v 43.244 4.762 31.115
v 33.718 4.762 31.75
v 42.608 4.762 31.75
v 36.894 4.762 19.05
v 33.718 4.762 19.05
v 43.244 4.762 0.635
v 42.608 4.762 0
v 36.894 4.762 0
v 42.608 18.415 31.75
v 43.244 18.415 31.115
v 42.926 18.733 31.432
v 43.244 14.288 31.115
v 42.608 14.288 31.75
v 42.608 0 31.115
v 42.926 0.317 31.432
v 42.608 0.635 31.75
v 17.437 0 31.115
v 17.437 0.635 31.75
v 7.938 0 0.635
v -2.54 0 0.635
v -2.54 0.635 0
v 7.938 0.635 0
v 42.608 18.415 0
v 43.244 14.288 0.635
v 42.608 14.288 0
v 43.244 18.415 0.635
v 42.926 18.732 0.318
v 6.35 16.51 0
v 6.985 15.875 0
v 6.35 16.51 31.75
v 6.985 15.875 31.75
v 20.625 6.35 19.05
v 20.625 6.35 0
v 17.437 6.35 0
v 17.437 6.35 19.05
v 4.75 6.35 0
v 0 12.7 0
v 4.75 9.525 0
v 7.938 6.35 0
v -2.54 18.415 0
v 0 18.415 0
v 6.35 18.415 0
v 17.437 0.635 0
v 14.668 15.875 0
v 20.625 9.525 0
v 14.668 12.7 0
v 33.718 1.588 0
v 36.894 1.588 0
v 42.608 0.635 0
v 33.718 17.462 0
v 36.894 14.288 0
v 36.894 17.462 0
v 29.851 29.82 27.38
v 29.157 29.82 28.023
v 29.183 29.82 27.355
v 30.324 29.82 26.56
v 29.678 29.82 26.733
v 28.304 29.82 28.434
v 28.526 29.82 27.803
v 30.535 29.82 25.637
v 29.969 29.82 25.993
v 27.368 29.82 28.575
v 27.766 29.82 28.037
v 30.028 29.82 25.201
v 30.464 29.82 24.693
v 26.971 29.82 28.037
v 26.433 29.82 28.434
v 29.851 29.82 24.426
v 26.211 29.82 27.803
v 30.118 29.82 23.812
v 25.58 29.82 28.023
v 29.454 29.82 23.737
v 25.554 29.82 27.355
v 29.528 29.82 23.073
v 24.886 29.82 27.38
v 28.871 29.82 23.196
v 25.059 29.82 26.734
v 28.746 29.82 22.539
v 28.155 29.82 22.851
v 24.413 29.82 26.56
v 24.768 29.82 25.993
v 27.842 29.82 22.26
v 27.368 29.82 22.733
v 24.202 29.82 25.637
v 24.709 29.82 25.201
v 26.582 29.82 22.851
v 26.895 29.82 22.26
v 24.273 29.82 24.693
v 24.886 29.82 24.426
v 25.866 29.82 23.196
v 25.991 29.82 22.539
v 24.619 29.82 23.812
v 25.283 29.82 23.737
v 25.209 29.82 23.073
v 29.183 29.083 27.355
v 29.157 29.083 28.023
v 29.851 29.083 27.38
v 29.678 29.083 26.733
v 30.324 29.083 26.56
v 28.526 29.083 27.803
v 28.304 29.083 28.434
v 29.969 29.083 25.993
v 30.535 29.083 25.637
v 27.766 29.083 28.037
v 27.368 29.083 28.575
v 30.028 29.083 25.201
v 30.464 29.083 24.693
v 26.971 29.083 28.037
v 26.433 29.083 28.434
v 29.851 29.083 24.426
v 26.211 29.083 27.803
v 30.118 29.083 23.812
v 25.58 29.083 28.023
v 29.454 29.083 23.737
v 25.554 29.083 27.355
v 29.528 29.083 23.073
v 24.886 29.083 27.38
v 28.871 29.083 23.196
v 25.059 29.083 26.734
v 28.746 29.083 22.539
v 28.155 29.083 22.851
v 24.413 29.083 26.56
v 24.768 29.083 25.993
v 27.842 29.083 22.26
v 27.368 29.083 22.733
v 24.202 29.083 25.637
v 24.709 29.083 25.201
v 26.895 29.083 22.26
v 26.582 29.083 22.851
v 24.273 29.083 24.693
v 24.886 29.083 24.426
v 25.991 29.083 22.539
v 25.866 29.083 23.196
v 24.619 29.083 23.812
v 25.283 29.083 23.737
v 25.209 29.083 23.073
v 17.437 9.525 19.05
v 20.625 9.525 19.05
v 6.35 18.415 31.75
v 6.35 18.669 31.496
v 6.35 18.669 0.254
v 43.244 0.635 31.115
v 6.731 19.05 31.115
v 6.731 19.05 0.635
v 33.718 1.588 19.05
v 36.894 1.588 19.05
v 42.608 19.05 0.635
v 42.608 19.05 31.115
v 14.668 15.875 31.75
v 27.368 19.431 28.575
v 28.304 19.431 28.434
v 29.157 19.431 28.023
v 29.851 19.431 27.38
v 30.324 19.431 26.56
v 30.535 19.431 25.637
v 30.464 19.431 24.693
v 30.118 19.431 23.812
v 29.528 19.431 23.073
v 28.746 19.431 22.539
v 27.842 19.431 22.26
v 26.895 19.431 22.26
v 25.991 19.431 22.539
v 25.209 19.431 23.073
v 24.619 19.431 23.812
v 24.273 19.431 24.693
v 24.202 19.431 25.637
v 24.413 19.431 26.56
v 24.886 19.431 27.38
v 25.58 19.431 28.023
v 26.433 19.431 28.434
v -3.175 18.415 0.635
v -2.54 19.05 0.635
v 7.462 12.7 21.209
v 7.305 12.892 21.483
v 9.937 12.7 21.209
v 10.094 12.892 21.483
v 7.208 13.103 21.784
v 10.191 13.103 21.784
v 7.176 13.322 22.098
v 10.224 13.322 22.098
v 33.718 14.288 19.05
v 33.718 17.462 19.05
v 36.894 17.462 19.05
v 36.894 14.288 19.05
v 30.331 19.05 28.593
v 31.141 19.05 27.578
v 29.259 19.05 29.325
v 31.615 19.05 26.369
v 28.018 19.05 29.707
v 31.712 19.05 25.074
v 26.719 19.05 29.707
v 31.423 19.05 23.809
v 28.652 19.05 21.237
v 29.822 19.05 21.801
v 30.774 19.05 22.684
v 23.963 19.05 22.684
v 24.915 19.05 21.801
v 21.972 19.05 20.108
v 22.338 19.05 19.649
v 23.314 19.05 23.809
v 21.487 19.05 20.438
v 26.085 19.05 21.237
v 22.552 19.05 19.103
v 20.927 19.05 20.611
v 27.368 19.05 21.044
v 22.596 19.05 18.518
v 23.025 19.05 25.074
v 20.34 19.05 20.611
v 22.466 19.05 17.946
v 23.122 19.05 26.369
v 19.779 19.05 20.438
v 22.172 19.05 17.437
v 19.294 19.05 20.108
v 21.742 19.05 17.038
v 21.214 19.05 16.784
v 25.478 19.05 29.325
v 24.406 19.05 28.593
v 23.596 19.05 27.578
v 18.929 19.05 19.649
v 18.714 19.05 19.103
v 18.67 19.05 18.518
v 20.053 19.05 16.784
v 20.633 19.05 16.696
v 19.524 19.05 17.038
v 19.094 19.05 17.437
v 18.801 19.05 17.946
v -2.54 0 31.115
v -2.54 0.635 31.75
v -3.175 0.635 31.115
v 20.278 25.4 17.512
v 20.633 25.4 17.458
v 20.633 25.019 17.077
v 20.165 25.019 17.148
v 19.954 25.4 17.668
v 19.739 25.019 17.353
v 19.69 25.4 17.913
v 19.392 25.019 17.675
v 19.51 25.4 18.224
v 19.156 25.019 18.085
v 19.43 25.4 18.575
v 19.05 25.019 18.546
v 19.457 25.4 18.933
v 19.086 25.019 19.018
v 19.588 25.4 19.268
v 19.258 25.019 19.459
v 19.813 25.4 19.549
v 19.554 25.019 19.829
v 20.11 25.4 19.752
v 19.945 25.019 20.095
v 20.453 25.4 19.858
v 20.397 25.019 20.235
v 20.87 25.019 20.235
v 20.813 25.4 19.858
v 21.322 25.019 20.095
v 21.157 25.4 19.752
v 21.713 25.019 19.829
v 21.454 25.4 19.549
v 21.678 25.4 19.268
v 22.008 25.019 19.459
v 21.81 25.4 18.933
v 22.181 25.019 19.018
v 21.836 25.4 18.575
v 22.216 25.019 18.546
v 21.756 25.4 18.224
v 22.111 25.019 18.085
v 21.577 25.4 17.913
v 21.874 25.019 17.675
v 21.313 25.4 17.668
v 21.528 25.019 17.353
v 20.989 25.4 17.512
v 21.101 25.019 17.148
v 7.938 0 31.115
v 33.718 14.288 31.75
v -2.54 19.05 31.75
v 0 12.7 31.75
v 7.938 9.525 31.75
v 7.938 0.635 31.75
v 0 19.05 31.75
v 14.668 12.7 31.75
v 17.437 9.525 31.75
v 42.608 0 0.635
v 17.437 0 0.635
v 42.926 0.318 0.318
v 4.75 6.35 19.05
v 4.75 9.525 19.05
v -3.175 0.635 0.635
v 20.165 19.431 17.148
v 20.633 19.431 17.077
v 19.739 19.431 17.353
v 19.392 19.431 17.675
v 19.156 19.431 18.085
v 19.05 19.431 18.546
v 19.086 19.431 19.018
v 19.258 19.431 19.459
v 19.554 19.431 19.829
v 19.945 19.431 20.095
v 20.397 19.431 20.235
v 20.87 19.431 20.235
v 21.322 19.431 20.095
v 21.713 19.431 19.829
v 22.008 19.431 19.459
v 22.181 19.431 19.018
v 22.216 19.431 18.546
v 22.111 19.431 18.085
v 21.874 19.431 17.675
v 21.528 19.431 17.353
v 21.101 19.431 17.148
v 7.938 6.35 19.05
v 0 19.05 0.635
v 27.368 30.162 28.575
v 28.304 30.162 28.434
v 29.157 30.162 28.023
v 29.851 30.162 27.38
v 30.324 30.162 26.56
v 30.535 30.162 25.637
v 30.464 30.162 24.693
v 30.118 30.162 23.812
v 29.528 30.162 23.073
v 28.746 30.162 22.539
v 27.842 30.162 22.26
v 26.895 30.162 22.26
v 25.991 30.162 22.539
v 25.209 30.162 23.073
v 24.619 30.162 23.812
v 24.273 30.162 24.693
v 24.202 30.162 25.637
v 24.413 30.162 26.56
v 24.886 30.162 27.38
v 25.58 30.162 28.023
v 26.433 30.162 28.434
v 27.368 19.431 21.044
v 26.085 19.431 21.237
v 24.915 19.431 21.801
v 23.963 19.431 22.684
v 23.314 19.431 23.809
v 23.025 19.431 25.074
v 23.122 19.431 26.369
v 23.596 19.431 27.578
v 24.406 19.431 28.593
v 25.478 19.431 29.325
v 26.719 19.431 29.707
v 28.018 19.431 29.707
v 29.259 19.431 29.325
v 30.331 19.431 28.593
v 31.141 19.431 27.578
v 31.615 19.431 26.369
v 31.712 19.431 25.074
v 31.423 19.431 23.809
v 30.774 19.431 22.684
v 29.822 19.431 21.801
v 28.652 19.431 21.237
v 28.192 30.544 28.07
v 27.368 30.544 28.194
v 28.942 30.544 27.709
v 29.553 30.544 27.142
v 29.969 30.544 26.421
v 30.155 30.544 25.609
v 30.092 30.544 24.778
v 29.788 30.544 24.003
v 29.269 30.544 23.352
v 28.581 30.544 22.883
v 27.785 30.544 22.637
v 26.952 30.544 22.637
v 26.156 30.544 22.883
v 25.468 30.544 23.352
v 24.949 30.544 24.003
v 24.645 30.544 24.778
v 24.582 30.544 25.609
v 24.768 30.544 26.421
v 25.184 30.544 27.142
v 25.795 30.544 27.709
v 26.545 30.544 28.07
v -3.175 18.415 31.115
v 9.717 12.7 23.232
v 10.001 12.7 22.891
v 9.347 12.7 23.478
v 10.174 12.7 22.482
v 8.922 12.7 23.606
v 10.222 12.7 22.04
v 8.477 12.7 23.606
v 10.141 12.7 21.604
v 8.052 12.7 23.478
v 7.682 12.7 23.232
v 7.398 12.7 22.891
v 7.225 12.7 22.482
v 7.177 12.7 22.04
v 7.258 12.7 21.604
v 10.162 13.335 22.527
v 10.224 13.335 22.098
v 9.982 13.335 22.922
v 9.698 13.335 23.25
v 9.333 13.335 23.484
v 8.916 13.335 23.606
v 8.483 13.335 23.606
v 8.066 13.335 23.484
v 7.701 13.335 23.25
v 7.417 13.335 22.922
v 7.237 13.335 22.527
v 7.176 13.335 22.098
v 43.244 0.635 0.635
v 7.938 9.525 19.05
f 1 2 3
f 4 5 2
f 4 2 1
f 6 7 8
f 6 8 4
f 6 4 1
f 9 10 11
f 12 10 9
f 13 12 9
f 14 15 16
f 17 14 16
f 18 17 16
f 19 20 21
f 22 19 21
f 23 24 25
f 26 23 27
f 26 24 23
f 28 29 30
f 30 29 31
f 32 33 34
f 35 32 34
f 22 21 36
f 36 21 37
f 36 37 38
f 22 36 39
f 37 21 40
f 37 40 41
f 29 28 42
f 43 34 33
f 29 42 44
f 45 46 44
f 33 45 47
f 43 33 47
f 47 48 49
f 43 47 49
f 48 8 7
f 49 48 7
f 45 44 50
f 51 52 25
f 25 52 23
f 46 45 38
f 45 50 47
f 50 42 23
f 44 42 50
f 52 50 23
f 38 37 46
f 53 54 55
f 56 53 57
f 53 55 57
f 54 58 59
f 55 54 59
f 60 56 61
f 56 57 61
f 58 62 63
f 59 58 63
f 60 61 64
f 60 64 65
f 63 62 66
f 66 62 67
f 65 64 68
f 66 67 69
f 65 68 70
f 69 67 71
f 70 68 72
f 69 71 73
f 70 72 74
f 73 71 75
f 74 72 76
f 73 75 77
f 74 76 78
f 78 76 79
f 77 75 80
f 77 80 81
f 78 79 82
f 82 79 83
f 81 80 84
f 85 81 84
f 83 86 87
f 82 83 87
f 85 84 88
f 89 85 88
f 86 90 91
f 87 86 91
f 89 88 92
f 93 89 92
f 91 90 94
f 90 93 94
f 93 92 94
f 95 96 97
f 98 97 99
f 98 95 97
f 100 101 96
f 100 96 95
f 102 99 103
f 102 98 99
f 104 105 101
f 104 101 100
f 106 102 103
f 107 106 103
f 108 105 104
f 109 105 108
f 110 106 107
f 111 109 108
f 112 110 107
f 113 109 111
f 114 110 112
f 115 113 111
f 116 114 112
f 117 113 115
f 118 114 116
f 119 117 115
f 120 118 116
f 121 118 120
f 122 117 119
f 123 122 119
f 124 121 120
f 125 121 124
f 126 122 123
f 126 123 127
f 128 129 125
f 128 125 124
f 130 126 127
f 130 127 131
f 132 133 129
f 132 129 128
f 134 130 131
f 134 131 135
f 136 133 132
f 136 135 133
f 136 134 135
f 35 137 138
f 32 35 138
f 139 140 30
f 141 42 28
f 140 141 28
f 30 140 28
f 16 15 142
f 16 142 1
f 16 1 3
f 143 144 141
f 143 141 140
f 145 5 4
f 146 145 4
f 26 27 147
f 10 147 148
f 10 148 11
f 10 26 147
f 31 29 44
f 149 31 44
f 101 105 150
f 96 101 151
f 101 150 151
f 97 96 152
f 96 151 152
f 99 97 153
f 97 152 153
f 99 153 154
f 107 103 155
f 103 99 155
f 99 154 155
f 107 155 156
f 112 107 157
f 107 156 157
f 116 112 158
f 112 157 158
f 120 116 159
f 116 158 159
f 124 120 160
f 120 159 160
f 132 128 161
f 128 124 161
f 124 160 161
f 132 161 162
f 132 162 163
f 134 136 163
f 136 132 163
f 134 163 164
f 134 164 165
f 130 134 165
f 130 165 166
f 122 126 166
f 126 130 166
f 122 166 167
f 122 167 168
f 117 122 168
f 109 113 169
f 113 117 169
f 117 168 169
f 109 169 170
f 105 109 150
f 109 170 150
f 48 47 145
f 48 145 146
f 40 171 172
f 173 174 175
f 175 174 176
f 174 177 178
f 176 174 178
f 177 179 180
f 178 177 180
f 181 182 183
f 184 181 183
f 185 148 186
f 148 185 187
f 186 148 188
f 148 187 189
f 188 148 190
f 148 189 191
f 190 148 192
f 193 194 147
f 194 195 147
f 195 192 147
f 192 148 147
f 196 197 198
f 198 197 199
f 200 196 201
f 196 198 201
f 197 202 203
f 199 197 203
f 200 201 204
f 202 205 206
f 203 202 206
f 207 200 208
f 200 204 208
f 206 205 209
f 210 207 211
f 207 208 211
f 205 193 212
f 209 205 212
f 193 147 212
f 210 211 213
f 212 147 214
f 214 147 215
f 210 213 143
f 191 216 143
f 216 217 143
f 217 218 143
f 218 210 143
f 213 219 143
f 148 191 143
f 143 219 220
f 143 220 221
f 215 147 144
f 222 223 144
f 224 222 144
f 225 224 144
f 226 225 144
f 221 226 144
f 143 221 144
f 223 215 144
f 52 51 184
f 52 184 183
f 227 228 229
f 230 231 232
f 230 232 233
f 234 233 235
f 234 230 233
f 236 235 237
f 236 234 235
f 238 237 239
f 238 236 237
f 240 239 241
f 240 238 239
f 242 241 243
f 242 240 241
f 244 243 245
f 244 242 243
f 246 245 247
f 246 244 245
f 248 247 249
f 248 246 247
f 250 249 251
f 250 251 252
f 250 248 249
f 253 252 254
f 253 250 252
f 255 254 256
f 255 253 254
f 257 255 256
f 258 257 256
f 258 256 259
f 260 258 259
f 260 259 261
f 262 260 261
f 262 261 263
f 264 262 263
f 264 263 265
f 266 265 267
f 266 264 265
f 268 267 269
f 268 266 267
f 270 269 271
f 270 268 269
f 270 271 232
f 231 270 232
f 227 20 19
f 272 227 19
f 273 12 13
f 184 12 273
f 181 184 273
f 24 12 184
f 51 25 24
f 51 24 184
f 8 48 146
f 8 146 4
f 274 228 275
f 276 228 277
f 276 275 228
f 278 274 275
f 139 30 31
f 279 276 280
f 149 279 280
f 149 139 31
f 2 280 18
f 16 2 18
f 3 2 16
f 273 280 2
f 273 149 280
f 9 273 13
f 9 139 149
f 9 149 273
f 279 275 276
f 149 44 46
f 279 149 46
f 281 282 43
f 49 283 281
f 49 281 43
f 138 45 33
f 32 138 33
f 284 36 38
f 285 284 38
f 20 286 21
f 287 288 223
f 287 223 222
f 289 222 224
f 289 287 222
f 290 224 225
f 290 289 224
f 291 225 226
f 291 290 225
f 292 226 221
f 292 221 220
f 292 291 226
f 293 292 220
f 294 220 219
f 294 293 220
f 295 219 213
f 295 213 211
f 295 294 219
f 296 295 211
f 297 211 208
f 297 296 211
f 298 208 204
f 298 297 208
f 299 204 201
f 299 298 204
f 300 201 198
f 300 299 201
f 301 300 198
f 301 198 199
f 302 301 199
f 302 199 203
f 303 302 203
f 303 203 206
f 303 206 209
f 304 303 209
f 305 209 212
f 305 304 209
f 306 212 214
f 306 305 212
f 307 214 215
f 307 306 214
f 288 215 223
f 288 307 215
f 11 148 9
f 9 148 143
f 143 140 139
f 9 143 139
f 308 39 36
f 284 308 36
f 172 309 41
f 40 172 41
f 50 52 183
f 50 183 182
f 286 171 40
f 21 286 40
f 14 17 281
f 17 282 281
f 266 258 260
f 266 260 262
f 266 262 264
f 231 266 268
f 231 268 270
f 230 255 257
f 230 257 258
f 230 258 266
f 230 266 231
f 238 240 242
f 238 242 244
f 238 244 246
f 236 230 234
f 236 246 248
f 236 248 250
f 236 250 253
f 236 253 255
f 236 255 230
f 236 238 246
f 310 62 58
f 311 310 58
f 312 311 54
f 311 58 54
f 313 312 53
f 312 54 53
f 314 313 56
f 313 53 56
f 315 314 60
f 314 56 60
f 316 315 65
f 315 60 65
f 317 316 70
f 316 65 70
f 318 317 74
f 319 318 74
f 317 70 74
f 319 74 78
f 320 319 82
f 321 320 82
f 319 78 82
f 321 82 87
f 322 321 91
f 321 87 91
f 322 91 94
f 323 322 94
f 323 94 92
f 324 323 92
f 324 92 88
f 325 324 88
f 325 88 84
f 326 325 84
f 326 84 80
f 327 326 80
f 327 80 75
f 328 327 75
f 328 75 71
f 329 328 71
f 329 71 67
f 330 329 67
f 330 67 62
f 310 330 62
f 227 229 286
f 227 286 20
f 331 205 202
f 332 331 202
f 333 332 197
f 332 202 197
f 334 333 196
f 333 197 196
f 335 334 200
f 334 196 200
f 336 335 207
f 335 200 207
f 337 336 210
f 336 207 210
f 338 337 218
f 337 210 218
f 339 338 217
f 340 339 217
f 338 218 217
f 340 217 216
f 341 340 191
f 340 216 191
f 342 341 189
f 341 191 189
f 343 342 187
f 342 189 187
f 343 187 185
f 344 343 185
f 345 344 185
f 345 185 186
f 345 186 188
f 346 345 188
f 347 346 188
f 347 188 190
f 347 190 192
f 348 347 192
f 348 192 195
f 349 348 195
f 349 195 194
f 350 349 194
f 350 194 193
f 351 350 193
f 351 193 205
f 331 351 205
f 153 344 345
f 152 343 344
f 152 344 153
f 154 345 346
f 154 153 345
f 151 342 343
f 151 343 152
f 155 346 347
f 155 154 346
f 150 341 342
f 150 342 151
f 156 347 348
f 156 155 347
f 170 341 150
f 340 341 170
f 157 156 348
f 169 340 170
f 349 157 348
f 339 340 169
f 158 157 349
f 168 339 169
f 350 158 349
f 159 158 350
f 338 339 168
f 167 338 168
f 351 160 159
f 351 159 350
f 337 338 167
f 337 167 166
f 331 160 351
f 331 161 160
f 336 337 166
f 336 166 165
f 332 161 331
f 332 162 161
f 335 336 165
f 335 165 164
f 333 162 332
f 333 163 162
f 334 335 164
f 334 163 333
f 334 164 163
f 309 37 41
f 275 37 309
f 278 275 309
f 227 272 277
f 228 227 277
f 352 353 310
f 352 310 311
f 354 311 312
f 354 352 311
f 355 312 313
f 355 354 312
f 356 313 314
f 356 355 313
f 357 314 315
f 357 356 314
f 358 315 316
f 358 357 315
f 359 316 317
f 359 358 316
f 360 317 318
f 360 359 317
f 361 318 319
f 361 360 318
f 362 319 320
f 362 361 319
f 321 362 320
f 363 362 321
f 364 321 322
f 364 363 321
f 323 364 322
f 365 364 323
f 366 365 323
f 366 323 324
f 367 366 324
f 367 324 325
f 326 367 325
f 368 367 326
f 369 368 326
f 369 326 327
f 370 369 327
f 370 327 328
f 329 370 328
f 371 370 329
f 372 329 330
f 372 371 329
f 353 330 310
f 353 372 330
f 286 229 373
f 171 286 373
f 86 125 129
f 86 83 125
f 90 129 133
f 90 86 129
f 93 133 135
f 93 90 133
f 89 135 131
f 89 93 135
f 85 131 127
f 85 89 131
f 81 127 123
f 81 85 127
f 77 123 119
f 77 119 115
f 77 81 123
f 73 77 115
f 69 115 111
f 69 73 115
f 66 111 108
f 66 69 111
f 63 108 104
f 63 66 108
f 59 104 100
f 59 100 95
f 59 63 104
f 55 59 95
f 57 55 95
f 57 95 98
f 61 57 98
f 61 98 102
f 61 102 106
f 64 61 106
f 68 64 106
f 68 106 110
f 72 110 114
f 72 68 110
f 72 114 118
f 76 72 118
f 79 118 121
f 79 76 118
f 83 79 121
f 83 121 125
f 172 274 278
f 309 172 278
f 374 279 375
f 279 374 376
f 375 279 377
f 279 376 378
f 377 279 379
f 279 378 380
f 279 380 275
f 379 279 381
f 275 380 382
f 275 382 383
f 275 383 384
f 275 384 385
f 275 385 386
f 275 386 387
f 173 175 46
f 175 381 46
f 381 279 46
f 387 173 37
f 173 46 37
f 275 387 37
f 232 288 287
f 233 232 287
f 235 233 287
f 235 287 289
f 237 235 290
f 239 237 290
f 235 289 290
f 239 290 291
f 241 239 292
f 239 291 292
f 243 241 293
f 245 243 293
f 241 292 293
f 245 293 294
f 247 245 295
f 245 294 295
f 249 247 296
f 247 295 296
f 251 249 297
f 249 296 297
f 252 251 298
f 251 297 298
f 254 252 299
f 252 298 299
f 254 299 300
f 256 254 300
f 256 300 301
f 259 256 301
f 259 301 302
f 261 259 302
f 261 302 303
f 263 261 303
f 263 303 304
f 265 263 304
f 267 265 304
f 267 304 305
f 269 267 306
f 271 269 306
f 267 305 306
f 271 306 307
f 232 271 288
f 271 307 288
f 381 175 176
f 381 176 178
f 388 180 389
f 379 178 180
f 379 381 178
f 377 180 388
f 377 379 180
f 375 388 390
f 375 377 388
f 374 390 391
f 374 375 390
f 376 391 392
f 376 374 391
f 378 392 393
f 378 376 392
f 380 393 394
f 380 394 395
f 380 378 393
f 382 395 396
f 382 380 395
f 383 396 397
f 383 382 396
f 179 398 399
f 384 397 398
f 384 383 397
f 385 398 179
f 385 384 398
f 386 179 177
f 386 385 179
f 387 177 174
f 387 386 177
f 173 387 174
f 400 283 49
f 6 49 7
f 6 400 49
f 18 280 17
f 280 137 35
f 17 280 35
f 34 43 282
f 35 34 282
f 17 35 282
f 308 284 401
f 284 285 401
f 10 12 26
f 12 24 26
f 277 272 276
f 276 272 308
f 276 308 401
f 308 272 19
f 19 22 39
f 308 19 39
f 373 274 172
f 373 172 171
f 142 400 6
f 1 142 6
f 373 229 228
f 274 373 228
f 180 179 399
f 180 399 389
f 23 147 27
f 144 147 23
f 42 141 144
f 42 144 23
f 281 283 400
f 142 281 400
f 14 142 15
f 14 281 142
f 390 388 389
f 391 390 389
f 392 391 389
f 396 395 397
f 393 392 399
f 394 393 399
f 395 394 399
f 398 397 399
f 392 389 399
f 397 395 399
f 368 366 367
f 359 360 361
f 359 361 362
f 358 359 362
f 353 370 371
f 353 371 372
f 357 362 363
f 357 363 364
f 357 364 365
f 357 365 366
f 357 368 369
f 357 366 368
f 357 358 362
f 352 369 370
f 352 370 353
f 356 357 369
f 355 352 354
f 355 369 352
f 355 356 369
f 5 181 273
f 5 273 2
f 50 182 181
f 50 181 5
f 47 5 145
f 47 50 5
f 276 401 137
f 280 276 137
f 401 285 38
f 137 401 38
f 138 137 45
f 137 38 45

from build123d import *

# Parameters (mm, degrees)
BOSS_EXTRUDE1_DEPTH  = 31.75
CUT_EXTRUDE2_DEPTH   = 57.92947648
CUT_EXTRUDE1_DEPTH   = 57.92947648
FILLET1_R            = 2.54
CHAMFER1_SIZE        = 0.635
SKETCH5_R            = 4.3561
BOSS_EXTRUDE3_DEPTH  = 0.381
SKETCH6_R            = 3.175
BOSS_EXTRUDE4_DEPTH  = 11.1125
CHAMFER7_SIZE        = 0.381
CUT_EXTRUDE3_DEPTH   = 57.92947648
SKETCH12_W           = 19.05
SKETCH12_H           = 19.05
BOSS_EXTRUDE9_DEPTH  = 31.75
CUT_EXTRUDE4_DEPTH   = 62.733039651
CHAMFER6_SIZE        = 0.635
SKETCH16_W           = 1.016
SKETCH16_H           = 0.7366
SKETCH7_R            = 1.5875
BOSS_EXTRUDE11_DEPTH = 6.35
CHAMFER9_SIZE        = 0.381
SKETCH18_W           = 3.81
SKETCH18_H           = 3.81
BOSS_EXTRUDE12_DEPTH = 12.7
BOSS_EXTRUDE13_DEPTH = 0.635
CHAMFER10_SIZE       = 0.889
CHAMFER10_SIZE2      = 0.622484501
SKETCH20_W           = 3.175
SKETCH20_H           = 19.05
BOSS_EXTRUDE14_DEPTH = 31.75


with BuildPart() as part:
    # Sketch1 → Boss-Extrude1 (new body)
    with BuildSketch(Plane.XY):
        Polygon((0, 0), (7.9375, 0), (7.9375, 6.35), (4.7498, 6.35), (4.7498, 9.525), (20.6248, 9.525), (20.6248, 6.35), (17.4371, 6.35), (17.4371, 0), (43.2435, 0), (43.2435, 19.05), (0, 19.05), align=None)
    extrude(amount=BOSS_EXTRUDE1_DEPTH)

    # Sketch3 → Cut-Extrude2 (cut, through all)
    with BuildSketch(Plane.XY):
        Polygon((6.35, 15.875), (14.6685, 15.875), (14.6685, 12.7), (0, 12.7), (0, 19.05), (6.35, 19.05), align=None)
    extrude(amount=CUT_EXTRUDE2_DEPTH, mode=Mode.SUBTRACT)

    # Sketch2 → Cut-Extrude1 (cut, through all)
    with BuildSketch(Plane.XY):
        Polygon((25.3873, 0), (43.2435, 9.525), (43.2435, 0), align=None)
    extrude(amount=CUT_EXTRUDE1_DEPTH, mode=Mode.SUBTRACT)

    # Fillet1
    fillet1_edges = [part.edges().sort_by_distance(p)[0] for p in [
        (43.2435, 19.05, 15.875),
        (25.3873, 0, 15.875),
        (43.2435, 9.525, 15.875),
    ]]
    fillet(fillet1_edges, radius=FILLET1_R)

    # Chamfer1
    chamfer1_edges = [part.edges().sort_by_distance(p)[0] for p in [
        (6.35, 15.875, 15.875),
    ]]
    chamfer(chamfer1_edges, length=CHAMFER1_SIZE)

    # Sketch5 → Boss-Extrude3 (add)
    with BuildSketch(Plane(origin=(0, 19.05, 0), x_dir=(1, 0, 0), z_dir=(0, 1, 0))):
        with Locations(Location((27.3685, -25.4, 0), (0, 0, 90))):
            Circle(SKETCH5_R)
    extrude(amount=BOSS_EXTRUDE3_DEPTH)

    # Sketch6 → Boss-Extrude4 (add)
    with BuildSketch(Plane(origin=(0, 19.431, 0), x_dir=(1, 0, 0), z_dir=(0, 1, 0))):
        with Locations(Location((27.3685, -25.4, 0), (0, 0, 270))):
            Circle(SKETCH6_R)
    extrude(amount=BOSS_EXTRUDE4_DEPTH)

    # Chamfer7
    chamfer7_edges = [part.edges().sort_by_distance(p)[0] for p in [
        (6.35, 19.05, 15.875),
        (27.3685, 30.5435, 22.225),
    ]]
    chamfer(chamfer7_edges, length=CHAMFER7_SIZE)

    # Sketch9 → Cut-Extrude3 (cut, through all)
    with BuildSketch(Plane(origin=(0, 19.05, 0), x_dir=(1, 0, 0), z_dir=(0, 1, 0))):
        Polygon((27.3685, 0), (43.2435, -19.05), (43.2435, 0), align=None)
    extrude(amount=-CUT_EXTRUDE3_DEPTH, mode=Mode.SUBTRACT)

    # Sketch12 → Boss-Extrude9 (add, through all)
    with BuildSketch(Plane.XY):
        with Locations((33.7185, 9.525)):
            Rectangle(SKETCH12_W, SKETCH12_H)
    extrude(amount=BOSS_EXTRUDE9_DEPTH)

    # Sketch13 → Cut-Extrude4 (cut, through all)
    with BuildSketch(Plane.XY):
        Polygon((43.2435, 14.2875), (36.8935, 14.2875), (36.8935, 17.4625), (33.7185, 17.4625), (33.7185, 1.5875), (36.8935, 1.5875), (36.8935, 4.7625), (43.2435, 4.7625), align=None)
    extrude(amount=CUT_EXTRUDE4_DEPTH, mode=Mode.SUBTRACT)

    # Chamfer6
    chamfer6_edges = [part.edges().sort_by_distance(p)[0] for p in [
        (43.2435, 19.05, 15.875),
        (43.2435, 0, 15.875),
        (43.2435, 2.38125, 0),
        (43.2435, 16.66875, 0),
    ]]
    chamfer(chamfer6_edges, length=CHAMFER6_SIZE)

    # Sketch16 → Cut-Revolve1 (revolve, cut)
    with BuildSketch(Plane.XY.offset(25.4), mode=Mode.PRIVATE) as cut_revolve1_sk:
        with Locations((24.1935, 29.4513)):
            Rectangle(SKETCH16_W, SKETCH16_H)
    revolve(cut_revolve1_sk.sketch.rotate(Axis((27.3685, 30.1625, 25.4), (0, 1, 0)), 270), axis=Axis((27.3685, 30.1625, 25.4), (0, 1, 0)), mode=Mode.SUBTRACT)

    # Sketch7 → Boss-Extrude11 (add)
    with BuildSketch(Plane(origin=(0, 19.05, 0), x_dir=(1, 0, 0), z_dir=(0, 1, 0))):
        with Locations(Location((20.633307909, -18.664807909, 0), (0, 0, 90))):
            Circle(SKETCH7_R)
    extrude(amount=BOSS_EXTRUDE11_DEPTH)

    # Chamfer9
    chamfer9_edges = [part.edges().sort_by_distance(p)[0] for p in [
        (20.633307909, 19.05, 20.252307909),
        (20.633307909, 25.4, 20.252307909),
    ]]
    chamfer(chamfer9_edges, length=CHAMFER9_SIZE)

    # Sketch18 → Boss-Extrude12 (add)
    with BuildSketch(Plane.XY.offset(31.75)):
        with Locations((6.0325, 8.001)):
            Rectangle(SKETCH18_W, SKETCH18_H)
        with Locations((19.3421, 8.001)):
            Rectangle(SKETCH18_W, SKETCH18_H)
        with Locations((35.3695, 2.8575)):
            Rectangle(SKETCH18_W, SKETCH18_H)
        with Locations((35.3695, 16.1925)):
            Rectangle(SKETCH18_W, SKETCH18_H)
    extrude(amount=-BOSS_EXTRUDE12_DEPTH)

    # Sketch19 → Boss-Extrude13 (add)
    with BuildSketch(Plane(origin=(0, 12.7, 0), x_dir=(1, 0, 0), z_dir=(0, 1, 0))):
        with BuildLine():
            Line((7.1755, -22.098), (10.2235, -22.098))
            ThreePointArc((10.2235, -22.098), (8.6995, -23.622), (7.1755, -22.098))
        make_face()
    extrude(amount=BOSS_EXTRUDE13_DEPTH)

    # Chamfer10
    chamfer10_edges = [part.edges().sort_by_distance(p)[0] for p in [
        (8.6995, 12.7, 22.098),
    ]]
    chamfer10_side = [part.faces().sort_by_distance(p)[0] for p in [
        (7.323470763, 12.7, 15.820759922),
    ]]
    chamfer(chamfer10_edges, length=CHAMFER10_SIZE, length2=CHAMFER10_SIZE2, reference=chamfer10_side[0])

    # Sketch20 → Boss-Extrude14 (add)
    with BuildSketch(Plane.XY.offset(31.75)):
        with Locations((-1.5875, 9.525)):
            Rectangle(SKETCH20_W, SKETCH20_H)
    extrude(amount=-BOSS_EXTRUDE14_DEPTH)

    # Chamfer11
    # the kernel refuses this chamfer: 0.635 mm, written as the material it takes off along each edge
    with BuildSketch(Plane(origin=(-2.751666667, 18.626666667, 0.423333333), x_dir=(-0.7071067811865465, -0.7071067811865485, 0), z_dir=(-0.5773502691896266, 0.577350269189625, -0.5773502691896257)), Plane(origin=(-2.751666667, 0.423333333, 0.423333333), x_dir=(-0.707106781186547, 0, 0.707106781186548), z_dir=(-0.5773502691896263, -0.5773502691896252, -0.5773502691896257))) as chamfer11_piece_1:
        Polygon((-0.449012806, 0.259237664), (0.449012806, 0.259237664), (0, -0.518475329), align=None)
    extrude(amount=0.806558326, mode=Mode.SUBTRACT)
    with BuildSketch(Plane(origin=(-2.751666667, 0.423333333, 31.326666667), x_dir=(-0.707106781186547, 0, -0.707106781186548), z_dir=(-0.5773502691896258, -0.5773502691896262, 0.5773502691896253))) as chamfer11_piece_2:
        Polygon((-0.449012806, -0.259237664), (0.449012806, -0.259237664), (0, 0.518475329), align=None)
    extrude(amount=0.806558326, mode=Mode.SUBTRACT)
    with BuildSketch(Plane(origin=(-3.175, 19.05, 33.383018697), x_dir=(0.9996219169112968, 0.027495876610584568, 0), z_dir=(0, 0, -1)), Plane(origin=(-3.175, 0, 33.383018697), x_dir=(-0.027495876610586605, 0.9996219169112968, 0), z_dir=(0, 0, -1))) as chamfer11_piece_3:
        with BuildLine():
            Line((0.653207479, 0), (-0.035907443, 0.652219799))
            Line((-0.035907443, 0.652219799), (-0.048602642, 0.651870601))
            ThreePointArc((-0.048602642, 0.651870601), (-0.021672059, 0.326007622), (-0.012695198, -0.000349198))
            Line((-0.012695198, -0.000349198), (0.000349198, -0.012695198))
            ThreePointArc((0.000349198, -0.012695198), (0.326706017, -0.003718338), (0.653556677, -0.012695198))
            Line((0.653556677, -0.012695198), (0.653207479, 0))
        make_face()
    extrude(amount=35.016037395, mode=Mode.SUBTRACT)
    with BuildSketch(Plane(origin=(5.097981303, 19.05, 0), x_dir=(0, 0.027495876610584568, 0.9996219169112968), z_dir=(1, 0, 0))) as chamfer11_piece_4:
        with BuildLine():
            Line((0.653207479, 0), (-0.035907443, 0.652219799))
            Line((-0.035907443, 0.652219799), (-0.048602642, 0.651870601))
            ThreePointArc((-0.048602642, 0.651870601), (-0.021672059, 0.326007622), (-0.012695198, -0.000349198))
            Line((-0.012695198, -0.000349198), (0.000349198, -0.012695198))
            ThreePointArc((0.000349198, -0.012695198), (0.326706017, -0.003718338), (0.653556677, -0.012695198))
            Line((0.653556677, -0.012695198), (0.653207479, 0))
        make_face()
    extrude(amount=39.143537395, mode=Mode.SUBTRACT)
    with BuildSketch(Plane(origin=(44.241518697, 0, 0), x_dir=(0, -0.027495876610586365, 0.9996219169112968), z_dir=(-1, 0, 0))) as chamfer11_piece_5:
        with BuildLine():
            Line((0.653207479, 0), (-0.035907443, 0.652219799))
            Line((-0.035907443, 0.652219799), (-0.048602642, 0.651870601))
            ThreePointArc((-0.048602642, 0.651870601), (-0.021672059, 0.326007622), (-0.012695198, -0.000349198))
            Line((-0.012695198, -0.000349198), (0.000349198, -0.012695198))
            ThreePointArc((0.000349198, -0.012695198), (0.326706017, -0.003718338), (0.653556677, -0.012695198))
            Line((0.653556677, -0.012695198), (0.653207479, 0))
        make_face()
    extrude(amount=28.437437395, mode=Mode.SUBTRACT)
    with BuildSketch(Plane(origin=(44.241518697, 0, 31.75), x_dir=(0, -0.02749587661058632, -0.9996219169112968), z_dir=(-1, 0, 0))) as chamfer11_piece_6:
        with BuildLine():
            Line((0.653207479, 0), (-0.035907443, -0.652219799))
            Line((-0.035907443, -0.652219799), (-0.048602642, -0.651870601))
            ThreePointArc((-0.048602642, -0.651870601), (-0.021672059, -0.326007622), (-0.012695198, 0.000349198))
            Line((-0.012695198, 0.000349198), (0.000349198, 0.012695198))
            ThreePointArc((0.000349198, 0.012695198), (0.326706017, 0.003718338), (0.653556677, 0.012695198))
            Line((0.653556677, 0.012695198), (0.653207479, 0))
        make_face()
    extrude(amount=28.437437395, mode=Mode.SUBTRACT)
    with BuildSketch(Plane(origin=(5.097981303, 19.05, 31.75), x_dir=(0, 0.02749587661058455, -0.9996219169112968), z_dir=(1, 0, 0))) as chamfer11_piece_7:
        with BuildLine():
            Line((0.653207479, 0), (-0.035907443, -0.652219799))
            Line((-0.035907443, -0.652219799), (-0.048602642, -0.651870601))
            ThreePointArc((-0.048602642, -0.651870601), (-0.021672059, -0.326007622), (-0.012695198, 0.000349198))
            Line((-0.012695198, 0.000349198), (0.000349198, 0.012695198))
            ThreePointArc((0.000349198, 0.012695198), (0.326706017, 0.003718338), (0.653556677, 0.012695198))
            Line((0.653556677, 0.012695198), (0.653207479, 0))
        make_face()
    extrude(amount=39.143537395, mode=Mode.SUBTRACT)
    with BuildSketch(Plane(origin=(-4.808018697, 19.05, 0), x_dir=(0, 0.0274958766105845, 0.9996219169112968), z_dir=(1, 0, 0))) as chamfer11_piece_8:
        with BuildLine():
            Line((0.653207479, 0), (-0.035907443, 0.652219799))
            Line((-0.035907443, 0.652219799), (-0.048602642, 0.651870601))
            ThreePointArc((-0.048602642, 0.651870601), (-0.021672059, 0.326007622), (-0.012695198, -0.000349198))
            Line((-0.012695198, -0.000349198), (0.000349198, -0.012695198))
            ThreePointArc((0.000349198, -0.012695198), (0.326706017, -0.003718338), (0.653556677, -0.012695198))
            Line((0.653556677, -0.012695198), (0.653207479, 0))
        make_face()
    extrude(amount=6.441037395, mode=Mode.SUBTRACT)
    with BuildSketch(Plane(origin=(9.570518697, 0, 0), x_dir=(0, -0.027495876610586365, 0.9996219169112968), z_dir=(-1, 0, 0)), Plane(origin=(-4.808018697, 0, 31.75), x_dir=(0, -0.02749587661058632, -0.9996219169112968), z_dir=(1, 0, 0))) as chamfer11_piece_9:
        with BuildLine():
            Line((0.653207479, 0), (-0.035907443, 0.652219799))
            Line((-0.035907443, 0.652219799), (-0.048602642, 0.651870601))
            ThreePointArc((-0.048602642, 0.651870601), (-0.021672059, 0.326007622), (-0.012695198, -0.000349198))
            Line((-0.012695198, -0.000349198), (0.000349198, -0.012695198))
            ThreePointArc((0.000349198, -0.012695198), (0.326706017, -0.003718338), (0.653556677, -0.012695198))
            Line((0.653556677, -0.012695198), (0.653207479, 0))
        make_face()
    extrude(amount=14.378537395, mode=Mode.SUBTRACT)
    with BuildSketch(Plane(origin=(43.2435, -0.998018697, 31.75), x_dir=(0.027495876610589984, 0, -0.9996219169112966), z_dir=(0, 1, 0)), Plane(origin=(43.2435, 12.654481303, 31.75), x_dir=(0.027495876610589984, 0, -0.9996219169112966), z_dir=(0, 1, 0))) as chamfer11_piece_10:
        with BuildLine():
            Line((0.653207479, 0), (-0.035907443, 0.652219799))
            Line((-0.035907443, 0.652219799), (-0.048602642, 0.651870601))
            ThreePointArc((-0.048602642, 0.651870601), (-0.021672059, 0.326007622), (-0.012695198, -0.000349198))
            Line((-0.012695198, -0.000349198), (0.000349198, -0.012695198))
            ThreePointArc((0.000349198, -0.012695198), (0.326706017, -0.003718338), (0.653556677, -0.012695198))
            Line((0.653556677, -0.012695198), (0.653207479, 0))
        make_face()
    extrude(amount=7.393537395, mode=Mode.SUBTRACT)
    with BuildSketch(Plane(origin=(-3.175, -1.633018697, 0), x_dir=(-0.02749587661058654, 0, 0.9996219169112968), z_dir=(0, 1, 0))) as chamfer11_piece_11:
        with BuildLine():
            Line((0.653207479, 0), (-0.035907443, 0.652219799))
            Line((-0.035907443, 0.652219799), (-0.048602642, 0.651870601))
            ThreePointArc((-0.048602642, 0.651870601), (-0.021672059, 0.326007622), (-0.012695198, -0.000349198))
            Line((-0.012695198, -0.000349198), (0.000349198, -0.012695198))
            ThreePointArc((0.000349198, -0.012695198), (0.326706017, -0.003718338), (0.653556677, -0.012695198))
            Line((0.653556677, -0.012695198), (0.653207479, 0))
        make_face()
    extrude(amount=22.316037395, mode=Mode.SUBTRACT)
    with BuildSketch(Plane(origin=(-3.175, -1.633018697, 31.75), x_dir=(-0.02749587661058659, 0, -0.9996219169112968), z_dir=(0, 1, 0))) as chamfer11_piece_12:
        with BuildLine():
            Line((0.653207479, 0), (-0.035907443, -0.652219799))
            Line((-0.035907443, -0.652219799), (-0.048602642, -0.651870601))
            ThreePointArc((-0.048602642, -0.651870601), (-0.021672059, -0.326007622), (-0.012695198, 0.000349198))
            Line((-0.012695198, 0.000349198), (0.000349198, 0.012695198))
            ThreePointArc((0.000349198, 0.012695198), (0.326706017, 0.003718338), (0.653556677, 0.012695198))
            Line((0.653556677, 0.012695198), (0.653207479, 0))
        make_face()
    extrude(amount=22.316037395, mode=Mode.SUBTRACT)


solid = part.part
